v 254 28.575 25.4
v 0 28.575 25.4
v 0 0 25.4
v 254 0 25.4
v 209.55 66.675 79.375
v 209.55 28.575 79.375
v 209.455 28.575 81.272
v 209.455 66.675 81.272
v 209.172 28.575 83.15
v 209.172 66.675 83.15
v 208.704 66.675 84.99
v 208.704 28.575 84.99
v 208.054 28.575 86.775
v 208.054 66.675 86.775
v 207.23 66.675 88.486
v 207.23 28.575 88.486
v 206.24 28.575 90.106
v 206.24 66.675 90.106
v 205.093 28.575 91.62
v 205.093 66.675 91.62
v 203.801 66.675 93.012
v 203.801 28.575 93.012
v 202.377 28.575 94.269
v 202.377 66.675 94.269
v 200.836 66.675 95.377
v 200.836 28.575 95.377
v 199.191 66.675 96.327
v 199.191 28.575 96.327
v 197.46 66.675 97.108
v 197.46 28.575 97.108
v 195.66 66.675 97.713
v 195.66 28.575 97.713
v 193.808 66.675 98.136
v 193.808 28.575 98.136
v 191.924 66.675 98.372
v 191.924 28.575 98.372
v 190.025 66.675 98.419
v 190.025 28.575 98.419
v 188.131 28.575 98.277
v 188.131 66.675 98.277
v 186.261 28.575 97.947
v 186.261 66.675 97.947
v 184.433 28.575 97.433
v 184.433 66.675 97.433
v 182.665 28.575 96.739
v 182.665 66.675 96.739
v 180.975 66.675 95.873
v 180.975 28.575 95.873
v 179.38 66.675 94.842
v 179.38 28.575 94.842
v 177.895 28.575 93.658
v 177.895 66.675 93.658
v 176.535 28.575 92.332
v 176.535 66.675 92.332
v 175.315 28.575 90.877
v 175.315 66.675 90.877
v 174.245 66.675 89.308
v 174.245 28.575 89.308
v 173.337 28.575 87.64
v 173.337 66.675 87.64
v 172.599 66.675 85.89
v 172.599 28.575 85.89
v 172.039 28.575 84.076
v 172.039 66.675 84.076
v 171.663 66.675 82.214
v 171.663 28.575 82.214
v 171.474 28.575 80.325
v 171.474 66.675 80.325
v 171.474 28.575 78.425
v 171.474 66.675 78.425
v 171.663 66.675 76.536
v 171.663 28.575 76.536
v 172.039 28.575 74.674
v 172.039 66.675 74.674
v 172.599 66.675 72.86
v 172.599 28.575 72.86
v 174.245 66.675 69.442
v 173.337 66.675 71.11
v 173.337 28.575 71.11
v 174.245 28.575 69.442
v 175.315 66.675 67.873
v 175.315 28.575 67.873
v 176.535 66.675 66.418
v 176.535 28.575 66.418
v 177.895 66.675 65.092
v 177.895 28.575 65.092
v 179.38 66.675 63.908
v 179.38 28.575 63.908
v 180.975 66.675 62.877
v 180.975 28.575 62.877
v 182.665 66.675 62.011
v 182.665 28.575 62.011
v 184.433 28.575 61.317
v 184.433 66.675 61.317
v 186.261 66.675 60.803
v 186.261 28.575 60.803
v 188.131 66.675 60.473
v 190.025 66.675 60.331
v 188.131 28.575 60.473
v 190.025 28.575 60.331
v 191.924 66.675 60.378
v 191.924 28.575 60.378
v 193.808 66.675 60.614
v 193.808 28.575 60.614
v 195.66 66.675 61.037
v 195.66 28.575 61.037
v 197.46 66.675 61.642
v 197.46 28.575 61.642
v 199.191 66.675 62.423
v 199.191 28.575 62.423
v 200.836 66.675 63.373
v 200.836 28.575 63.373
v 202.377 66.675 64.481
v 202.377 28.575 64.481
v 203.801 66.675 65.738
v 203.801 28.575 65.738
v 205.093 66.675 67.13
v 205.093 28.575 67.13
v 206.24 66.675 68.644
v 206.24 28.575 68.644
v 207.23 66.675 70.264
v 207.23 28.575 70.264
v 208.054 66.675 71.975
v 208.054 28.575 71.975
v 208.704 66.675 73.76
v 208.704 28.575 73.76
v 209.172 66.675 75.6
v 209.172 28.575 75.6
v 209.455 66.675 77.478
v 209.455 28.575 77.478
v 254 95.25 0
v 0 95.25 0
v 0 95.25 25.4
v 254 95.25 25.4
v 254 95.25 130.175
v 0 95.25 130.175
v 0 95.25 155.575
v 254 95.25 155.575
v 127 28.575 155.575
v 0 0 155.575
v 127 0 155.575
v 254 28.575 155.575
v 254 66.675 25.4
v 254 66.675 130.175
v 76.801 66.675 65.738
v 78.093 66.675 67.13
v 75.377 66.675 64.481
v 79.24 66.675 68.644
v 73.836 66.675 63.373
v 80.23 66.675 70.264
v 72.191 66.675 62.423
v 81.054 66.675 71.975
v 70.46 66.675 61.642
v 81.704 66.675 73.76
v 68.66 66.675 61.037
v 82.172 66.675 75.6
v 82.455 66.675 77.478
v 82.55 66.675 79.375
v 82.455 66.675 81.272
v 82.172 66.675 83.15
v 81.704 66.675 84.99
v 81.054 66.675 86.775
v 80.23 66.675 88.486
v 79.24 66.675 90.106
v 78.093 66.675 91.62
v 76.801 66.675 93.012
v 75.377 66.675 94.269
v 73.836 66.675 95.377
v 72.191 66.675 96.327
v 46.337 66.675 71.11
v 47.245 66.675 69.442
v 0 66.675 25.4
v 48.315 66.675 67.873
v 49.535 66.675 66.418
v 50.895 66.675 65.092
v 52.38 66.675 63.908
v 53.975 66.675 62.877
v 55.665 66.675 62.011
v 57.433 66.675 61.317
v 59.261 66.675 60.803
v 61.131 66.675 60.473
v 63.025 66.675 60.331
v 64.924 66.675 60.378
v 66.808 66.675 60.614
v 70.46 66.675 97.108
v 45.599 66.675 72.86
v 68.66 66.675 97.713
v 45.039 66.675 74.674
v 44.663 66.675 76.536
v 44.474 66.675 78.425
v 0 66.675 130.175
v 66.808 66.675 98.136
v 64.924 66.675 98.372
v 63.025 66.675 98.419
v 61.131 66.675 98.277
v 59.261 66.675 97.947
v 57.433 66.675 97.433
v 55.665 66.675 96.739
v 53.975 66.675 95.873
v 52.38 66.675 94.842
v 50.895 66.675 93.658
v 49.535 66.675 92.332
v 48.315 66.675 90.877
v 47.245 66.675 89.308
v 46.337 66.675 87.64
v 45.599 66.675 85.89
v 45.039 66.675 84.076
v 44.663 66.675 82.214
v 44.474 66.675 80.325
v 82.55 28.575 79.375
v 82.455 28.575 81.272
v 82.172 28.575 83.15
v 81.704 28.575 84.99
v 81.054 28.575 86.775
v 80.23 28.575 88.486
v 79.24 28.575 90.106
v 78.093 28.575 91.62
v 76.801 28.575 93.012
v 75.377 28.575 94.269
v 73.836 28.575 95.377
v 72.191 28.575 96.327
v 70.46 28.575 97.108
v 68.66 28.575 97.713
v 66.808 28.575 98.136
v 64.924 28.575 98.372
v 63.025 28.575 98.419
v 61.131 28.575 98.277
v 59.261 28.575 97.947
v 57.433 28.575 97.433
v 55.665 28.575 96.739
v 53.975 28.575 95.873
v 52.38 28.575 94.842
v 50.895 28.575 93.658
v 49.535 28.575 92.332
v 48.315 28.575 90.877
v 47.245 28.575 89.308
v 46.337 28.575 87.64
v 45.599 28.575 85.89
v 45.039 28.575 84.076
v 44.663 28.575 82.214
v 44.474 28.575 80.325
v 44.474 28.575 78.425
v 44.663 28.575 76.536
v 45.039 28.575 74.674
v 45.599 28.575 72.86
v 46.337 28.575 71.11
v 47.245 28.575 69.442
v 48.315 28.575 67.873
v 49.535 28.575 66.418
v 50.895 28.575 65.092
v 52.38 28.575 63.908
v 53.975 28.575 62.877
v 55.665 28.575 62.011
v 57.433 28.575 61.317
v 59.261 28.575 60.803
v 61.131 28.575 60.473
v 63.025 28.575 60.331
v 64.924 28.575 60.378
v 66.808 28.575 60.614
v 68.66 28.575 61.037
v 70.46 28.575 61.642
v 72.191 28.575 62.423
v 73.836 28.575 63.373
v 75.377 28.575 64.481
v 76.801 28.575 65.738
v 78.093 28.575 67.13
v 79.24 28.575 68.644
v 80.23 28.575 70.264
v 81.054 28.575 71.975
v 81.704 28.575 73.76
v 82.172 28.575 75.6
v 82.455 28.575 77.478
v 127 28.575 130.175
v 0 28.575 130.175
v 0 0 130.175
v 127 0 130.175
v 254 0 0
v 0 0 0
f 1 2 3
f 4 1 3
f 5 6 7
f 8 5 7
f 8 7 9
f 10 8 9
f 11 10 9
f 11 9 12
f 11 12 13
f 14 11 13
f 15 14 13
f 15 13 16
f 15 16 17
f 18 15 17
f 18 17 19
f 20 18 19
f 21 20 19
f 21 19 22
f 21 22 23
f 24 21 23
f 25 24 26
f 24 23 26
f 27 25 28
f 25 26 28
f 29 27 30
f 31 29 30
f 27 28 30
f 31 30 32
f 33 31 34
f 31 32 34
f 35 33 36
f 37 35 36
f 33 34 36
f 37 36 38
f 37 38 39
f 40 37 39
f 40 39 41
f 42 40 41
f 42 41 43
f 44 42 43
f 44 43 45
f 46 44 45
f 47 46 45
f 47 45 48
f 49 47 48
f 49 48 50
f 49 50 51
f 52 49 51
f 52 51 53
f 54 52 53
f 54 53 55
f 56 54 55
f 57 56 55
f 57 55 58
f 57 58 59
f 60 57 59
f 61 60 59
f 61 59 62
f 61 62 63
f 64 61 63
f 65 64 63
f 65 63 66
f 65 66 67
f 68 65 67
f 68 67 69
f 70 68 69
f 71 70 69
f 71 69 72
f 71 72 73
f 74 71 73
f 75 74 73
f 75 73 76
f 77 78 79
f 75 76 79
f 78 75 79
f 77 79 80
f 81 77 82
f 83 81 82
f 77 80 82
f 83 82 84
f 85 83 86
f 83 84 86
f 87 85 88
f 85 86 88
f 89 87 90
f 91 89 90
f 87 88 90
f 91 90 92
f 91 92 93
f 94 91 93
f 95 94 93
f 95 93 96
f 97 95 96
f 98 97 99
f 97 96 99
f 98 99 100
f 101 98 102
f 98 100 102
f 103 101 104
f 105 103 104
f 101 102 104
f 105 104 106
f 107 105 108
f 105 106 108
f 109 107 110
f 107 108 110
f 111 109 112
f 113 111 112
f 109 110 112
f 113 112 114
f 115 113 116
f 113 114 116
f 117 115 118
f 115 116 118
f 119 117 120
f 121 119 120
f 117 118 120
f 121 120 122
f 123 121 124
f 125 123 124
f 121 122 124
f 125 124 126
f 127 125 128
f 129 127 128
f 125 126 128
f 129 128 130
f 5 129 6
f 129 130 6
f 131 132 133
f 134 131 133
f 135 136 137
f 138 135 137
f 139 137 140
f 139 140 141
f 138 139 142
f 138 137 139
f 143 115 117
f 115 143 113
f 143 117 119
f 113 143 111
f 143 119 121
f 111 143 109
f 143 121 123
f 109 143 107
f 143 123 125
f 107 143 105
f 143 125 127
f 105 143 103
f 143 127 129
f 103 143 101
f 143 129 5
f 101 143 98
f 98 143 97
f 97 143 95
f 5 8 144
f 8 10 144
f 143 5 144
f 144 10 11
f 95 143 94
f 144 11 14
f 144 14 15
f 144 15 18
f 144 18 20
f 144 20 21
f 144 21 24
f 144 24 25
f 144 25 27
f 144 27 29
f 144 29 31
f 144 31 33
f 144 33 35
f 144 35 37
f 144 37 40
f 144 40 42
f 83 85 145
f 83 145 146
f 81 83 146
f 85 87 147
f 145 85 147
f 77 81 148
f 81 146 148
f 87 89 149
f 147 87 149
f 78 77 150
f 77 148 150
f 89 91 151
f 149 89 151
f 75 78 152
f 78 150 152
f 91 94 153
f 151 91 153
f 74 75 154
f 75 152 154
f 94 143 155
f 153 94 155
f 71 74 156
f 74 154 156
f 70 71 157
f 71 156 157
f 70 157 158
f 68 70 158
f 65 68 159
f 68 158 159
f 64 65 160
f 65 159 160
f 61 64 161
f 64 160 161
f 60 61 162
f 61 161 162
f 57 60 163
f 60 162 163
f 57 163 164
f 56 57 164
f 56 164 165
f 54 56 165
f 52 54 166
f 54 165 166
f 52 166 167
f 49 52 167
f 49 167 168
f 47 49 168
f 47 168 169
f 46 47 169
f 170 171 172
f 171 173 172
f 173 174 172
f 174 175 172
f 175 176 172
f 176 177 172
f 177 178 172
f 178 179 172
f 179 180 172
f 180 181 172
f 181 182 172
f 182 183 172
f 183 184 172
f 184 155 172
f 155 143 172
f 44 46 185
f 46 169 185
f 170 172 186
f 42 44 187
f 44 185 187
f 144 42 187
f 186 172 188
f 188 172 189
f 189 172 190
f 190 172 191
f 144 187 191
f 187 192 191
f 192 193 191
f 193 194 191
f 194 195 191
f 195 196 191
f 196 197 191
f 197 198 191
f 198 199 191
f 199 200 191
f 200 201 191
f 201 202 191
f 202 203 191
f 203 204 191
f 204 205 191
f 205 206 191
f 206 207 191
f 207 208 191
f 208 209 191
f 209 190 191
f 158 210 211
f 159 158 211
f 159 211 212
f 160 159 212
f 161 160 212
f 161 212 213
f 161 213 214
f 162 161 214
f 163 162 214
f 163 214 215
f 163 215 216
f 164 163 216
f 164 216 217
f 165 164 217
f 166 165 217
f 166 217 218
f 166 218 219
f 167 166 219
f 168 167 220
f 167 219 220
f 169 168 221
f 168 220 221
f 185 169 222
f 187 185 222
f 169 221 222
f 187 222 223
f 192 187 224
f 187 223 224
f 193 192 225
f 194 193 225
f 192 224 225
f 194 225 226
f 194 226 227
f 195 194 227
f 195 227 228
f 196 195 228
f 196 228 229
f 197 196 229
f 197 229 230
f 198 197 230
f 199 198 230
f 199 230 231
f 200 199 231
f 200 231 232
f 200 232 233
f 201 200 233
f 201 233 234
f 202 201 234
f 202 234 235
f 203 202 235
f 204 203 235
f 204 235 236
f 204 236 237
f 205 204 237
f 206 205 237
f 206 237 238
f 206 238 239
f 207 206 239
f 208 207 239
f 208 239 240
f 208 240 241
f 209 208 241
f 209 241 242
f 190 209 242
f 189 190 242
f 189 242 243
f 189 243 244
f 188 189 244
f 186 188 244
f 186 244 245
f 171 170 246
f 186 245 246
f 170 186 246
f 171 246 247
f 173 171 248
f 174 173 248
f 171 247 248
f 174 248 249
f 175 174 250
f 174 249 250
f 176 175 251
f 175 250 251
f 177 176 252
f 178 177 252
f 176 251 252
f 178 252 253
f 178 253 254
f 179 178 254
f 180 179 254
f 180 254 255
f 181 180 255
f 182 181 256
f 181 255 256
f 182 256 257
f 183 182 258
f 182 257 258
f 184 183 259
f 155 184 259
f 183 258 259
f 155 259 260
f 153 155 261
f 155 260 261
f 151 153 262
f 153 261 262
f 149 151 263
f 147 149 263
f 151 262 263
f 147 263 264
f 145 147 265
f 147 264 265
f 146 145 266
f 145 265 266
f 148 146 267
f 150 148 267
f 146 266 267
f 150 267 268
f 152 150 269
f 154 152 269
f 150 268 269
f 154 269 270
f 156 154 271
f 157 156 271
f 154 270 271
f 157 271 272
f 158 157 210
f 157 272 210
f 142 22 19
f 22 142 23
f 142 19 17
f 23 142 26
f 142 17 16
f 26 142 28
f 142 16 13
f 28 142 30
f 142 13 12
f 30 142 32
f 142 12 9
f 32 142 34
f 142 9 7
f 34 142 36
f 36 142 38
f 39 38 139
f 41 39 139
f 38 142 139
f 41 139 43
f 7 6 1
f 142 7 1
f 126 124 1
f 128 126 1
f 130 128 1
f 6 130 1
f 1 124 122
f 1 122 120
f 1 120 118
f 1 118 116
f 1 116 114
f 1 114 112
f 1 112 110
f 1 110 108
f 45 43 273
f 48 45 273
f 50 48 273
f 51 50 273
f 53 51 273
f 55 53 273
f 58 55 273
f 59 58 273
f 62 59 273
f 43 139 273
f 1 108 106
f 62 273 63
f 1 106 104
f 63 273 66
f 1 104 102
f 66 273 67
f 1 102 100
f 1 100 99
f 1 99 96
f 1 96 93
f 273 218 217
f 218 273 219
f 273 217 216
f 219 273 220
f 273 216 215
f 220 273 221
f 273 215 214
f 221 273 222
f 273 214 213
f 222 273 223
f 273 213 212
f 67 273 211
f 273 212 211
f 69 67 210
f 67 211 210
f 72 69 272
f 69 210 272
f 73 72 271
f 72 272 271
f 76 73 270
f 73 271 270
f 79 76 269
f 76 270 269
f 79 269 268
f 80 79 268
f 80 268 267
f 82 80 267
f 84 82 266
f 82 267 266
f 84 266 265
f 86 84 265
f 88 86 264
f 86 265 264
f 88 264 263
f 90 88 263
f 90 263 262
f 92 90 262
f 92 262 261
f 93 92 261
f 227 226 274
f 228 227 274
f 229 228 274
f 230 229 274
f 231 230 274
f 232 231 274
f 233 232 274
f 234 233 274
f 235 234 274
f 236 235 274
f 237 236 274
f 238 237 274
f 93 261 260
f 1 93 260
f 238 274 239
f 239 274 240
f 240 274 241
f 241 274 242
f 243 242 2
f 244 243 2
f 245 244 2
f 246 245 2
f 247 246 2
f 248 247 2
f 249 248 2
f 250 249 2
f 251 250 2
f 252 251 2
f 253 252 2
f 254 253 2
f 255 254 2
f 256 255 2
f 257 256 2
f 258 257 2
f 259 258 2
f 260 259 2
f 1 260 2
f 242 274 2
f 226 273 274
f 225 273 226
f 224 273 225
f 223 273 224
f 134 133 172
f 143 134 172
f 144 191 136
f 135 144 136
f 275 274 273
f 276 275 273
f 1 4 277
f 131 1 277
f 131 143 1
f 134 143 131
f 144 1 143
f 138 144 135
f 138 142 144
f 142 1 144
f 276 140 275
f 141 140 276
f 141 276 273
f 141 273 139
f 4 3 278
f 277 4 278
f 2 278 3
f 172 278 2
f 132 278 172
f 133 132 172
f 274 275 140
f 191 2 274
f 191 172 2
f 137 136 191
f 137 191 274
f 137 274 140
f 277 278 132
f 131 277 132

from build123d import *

# Parameters (mm, degrees)
F1_DEPTH = 254
F2_R     = 19.05
F3_DEPTH = 101.346
F2_W     = 127
F2_H     = 25.4
F4_DEPTH = 28.575


with BuildPart() as f1:
    # F0 (on Right) → F1 (new body)
    with BuildSketch(Plane.YZ):
        Polygon((0, 25.4), (0, 0), (95.25, 0), (95.25, 25.4), (66.675, 25.4), (66.675, 130.175), (95.25, 130.175), (95.25, 155.575), (28.575, 155.575), (28.575, 25.4), align=None)
    extrude(amount=F1_DEPTH)

    # F2 (on face) → F3 (cut)
    with BuildSketch(Plane.XZ.offset(-28.575)):
        with Locations((63.5, 79.375)):
            Circle(F2_R)
        with Locations((190.5, 79.375)):
            Circle(F2_R)
    extrude(amount=-F3_DEPTH, mode=Mode.SUBTRACT)

    # F2 (on face) → F4 (join, through all)
    with BuildSketch(Plane.XZ.offset(-28.575)):
        with Locations((63.5, 142.875)):
            Rectangle(F2_W, F2_H)
    extrude(amount=F4_DEPTH)


solid = f1.part
